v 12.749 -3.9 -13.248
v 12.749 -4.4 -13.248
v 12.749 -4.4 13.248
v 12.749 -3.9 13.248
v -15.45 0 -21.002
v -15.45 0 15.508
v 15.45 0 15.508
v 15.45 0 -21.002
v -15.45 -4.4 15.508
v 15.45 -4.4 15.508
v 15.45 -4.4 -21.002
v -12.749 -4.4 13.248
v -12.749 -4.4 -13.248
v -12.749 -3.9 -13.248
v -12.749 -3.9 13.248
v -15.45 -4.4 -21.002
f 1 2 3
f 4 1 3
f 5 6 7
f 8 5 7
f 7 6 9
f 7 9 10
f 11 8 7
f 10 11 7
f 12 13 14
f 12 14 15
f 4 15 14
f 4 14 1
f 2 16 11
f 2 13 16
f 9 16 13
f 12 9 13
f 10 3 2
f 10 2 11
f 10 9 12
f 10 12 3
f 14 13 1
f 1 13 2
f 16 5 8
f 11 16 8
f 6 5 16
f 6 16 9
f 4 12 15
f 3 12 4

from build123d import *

# Parameters (mm, degrees)
F0_W     = 30.9
F0_H     = 36.51
F1_DEPTH = 4.4
F2_W     = 25.4976
F2_H     = 26.496
F3_DEPTH = 0.5


with BuildPart() as f1:
    # F0 (on Front) → F1 (new body)
    with BuildSketch(Plane.XZ):
        with Locations((0, -2.747)):
            Rectangle(F0_W, F0_H)
    extrude(amount=F1_DEPTH)

    # F2 (on face) → F3 (cut)
    with BuildSketch(Plane.XZ.offset(4.4)):
        Rectangle(F2_W, F2_H)
    extrude(amount=-F3_DEPTH, mode=Mode.SUBTRACT)


solid = f1.part
